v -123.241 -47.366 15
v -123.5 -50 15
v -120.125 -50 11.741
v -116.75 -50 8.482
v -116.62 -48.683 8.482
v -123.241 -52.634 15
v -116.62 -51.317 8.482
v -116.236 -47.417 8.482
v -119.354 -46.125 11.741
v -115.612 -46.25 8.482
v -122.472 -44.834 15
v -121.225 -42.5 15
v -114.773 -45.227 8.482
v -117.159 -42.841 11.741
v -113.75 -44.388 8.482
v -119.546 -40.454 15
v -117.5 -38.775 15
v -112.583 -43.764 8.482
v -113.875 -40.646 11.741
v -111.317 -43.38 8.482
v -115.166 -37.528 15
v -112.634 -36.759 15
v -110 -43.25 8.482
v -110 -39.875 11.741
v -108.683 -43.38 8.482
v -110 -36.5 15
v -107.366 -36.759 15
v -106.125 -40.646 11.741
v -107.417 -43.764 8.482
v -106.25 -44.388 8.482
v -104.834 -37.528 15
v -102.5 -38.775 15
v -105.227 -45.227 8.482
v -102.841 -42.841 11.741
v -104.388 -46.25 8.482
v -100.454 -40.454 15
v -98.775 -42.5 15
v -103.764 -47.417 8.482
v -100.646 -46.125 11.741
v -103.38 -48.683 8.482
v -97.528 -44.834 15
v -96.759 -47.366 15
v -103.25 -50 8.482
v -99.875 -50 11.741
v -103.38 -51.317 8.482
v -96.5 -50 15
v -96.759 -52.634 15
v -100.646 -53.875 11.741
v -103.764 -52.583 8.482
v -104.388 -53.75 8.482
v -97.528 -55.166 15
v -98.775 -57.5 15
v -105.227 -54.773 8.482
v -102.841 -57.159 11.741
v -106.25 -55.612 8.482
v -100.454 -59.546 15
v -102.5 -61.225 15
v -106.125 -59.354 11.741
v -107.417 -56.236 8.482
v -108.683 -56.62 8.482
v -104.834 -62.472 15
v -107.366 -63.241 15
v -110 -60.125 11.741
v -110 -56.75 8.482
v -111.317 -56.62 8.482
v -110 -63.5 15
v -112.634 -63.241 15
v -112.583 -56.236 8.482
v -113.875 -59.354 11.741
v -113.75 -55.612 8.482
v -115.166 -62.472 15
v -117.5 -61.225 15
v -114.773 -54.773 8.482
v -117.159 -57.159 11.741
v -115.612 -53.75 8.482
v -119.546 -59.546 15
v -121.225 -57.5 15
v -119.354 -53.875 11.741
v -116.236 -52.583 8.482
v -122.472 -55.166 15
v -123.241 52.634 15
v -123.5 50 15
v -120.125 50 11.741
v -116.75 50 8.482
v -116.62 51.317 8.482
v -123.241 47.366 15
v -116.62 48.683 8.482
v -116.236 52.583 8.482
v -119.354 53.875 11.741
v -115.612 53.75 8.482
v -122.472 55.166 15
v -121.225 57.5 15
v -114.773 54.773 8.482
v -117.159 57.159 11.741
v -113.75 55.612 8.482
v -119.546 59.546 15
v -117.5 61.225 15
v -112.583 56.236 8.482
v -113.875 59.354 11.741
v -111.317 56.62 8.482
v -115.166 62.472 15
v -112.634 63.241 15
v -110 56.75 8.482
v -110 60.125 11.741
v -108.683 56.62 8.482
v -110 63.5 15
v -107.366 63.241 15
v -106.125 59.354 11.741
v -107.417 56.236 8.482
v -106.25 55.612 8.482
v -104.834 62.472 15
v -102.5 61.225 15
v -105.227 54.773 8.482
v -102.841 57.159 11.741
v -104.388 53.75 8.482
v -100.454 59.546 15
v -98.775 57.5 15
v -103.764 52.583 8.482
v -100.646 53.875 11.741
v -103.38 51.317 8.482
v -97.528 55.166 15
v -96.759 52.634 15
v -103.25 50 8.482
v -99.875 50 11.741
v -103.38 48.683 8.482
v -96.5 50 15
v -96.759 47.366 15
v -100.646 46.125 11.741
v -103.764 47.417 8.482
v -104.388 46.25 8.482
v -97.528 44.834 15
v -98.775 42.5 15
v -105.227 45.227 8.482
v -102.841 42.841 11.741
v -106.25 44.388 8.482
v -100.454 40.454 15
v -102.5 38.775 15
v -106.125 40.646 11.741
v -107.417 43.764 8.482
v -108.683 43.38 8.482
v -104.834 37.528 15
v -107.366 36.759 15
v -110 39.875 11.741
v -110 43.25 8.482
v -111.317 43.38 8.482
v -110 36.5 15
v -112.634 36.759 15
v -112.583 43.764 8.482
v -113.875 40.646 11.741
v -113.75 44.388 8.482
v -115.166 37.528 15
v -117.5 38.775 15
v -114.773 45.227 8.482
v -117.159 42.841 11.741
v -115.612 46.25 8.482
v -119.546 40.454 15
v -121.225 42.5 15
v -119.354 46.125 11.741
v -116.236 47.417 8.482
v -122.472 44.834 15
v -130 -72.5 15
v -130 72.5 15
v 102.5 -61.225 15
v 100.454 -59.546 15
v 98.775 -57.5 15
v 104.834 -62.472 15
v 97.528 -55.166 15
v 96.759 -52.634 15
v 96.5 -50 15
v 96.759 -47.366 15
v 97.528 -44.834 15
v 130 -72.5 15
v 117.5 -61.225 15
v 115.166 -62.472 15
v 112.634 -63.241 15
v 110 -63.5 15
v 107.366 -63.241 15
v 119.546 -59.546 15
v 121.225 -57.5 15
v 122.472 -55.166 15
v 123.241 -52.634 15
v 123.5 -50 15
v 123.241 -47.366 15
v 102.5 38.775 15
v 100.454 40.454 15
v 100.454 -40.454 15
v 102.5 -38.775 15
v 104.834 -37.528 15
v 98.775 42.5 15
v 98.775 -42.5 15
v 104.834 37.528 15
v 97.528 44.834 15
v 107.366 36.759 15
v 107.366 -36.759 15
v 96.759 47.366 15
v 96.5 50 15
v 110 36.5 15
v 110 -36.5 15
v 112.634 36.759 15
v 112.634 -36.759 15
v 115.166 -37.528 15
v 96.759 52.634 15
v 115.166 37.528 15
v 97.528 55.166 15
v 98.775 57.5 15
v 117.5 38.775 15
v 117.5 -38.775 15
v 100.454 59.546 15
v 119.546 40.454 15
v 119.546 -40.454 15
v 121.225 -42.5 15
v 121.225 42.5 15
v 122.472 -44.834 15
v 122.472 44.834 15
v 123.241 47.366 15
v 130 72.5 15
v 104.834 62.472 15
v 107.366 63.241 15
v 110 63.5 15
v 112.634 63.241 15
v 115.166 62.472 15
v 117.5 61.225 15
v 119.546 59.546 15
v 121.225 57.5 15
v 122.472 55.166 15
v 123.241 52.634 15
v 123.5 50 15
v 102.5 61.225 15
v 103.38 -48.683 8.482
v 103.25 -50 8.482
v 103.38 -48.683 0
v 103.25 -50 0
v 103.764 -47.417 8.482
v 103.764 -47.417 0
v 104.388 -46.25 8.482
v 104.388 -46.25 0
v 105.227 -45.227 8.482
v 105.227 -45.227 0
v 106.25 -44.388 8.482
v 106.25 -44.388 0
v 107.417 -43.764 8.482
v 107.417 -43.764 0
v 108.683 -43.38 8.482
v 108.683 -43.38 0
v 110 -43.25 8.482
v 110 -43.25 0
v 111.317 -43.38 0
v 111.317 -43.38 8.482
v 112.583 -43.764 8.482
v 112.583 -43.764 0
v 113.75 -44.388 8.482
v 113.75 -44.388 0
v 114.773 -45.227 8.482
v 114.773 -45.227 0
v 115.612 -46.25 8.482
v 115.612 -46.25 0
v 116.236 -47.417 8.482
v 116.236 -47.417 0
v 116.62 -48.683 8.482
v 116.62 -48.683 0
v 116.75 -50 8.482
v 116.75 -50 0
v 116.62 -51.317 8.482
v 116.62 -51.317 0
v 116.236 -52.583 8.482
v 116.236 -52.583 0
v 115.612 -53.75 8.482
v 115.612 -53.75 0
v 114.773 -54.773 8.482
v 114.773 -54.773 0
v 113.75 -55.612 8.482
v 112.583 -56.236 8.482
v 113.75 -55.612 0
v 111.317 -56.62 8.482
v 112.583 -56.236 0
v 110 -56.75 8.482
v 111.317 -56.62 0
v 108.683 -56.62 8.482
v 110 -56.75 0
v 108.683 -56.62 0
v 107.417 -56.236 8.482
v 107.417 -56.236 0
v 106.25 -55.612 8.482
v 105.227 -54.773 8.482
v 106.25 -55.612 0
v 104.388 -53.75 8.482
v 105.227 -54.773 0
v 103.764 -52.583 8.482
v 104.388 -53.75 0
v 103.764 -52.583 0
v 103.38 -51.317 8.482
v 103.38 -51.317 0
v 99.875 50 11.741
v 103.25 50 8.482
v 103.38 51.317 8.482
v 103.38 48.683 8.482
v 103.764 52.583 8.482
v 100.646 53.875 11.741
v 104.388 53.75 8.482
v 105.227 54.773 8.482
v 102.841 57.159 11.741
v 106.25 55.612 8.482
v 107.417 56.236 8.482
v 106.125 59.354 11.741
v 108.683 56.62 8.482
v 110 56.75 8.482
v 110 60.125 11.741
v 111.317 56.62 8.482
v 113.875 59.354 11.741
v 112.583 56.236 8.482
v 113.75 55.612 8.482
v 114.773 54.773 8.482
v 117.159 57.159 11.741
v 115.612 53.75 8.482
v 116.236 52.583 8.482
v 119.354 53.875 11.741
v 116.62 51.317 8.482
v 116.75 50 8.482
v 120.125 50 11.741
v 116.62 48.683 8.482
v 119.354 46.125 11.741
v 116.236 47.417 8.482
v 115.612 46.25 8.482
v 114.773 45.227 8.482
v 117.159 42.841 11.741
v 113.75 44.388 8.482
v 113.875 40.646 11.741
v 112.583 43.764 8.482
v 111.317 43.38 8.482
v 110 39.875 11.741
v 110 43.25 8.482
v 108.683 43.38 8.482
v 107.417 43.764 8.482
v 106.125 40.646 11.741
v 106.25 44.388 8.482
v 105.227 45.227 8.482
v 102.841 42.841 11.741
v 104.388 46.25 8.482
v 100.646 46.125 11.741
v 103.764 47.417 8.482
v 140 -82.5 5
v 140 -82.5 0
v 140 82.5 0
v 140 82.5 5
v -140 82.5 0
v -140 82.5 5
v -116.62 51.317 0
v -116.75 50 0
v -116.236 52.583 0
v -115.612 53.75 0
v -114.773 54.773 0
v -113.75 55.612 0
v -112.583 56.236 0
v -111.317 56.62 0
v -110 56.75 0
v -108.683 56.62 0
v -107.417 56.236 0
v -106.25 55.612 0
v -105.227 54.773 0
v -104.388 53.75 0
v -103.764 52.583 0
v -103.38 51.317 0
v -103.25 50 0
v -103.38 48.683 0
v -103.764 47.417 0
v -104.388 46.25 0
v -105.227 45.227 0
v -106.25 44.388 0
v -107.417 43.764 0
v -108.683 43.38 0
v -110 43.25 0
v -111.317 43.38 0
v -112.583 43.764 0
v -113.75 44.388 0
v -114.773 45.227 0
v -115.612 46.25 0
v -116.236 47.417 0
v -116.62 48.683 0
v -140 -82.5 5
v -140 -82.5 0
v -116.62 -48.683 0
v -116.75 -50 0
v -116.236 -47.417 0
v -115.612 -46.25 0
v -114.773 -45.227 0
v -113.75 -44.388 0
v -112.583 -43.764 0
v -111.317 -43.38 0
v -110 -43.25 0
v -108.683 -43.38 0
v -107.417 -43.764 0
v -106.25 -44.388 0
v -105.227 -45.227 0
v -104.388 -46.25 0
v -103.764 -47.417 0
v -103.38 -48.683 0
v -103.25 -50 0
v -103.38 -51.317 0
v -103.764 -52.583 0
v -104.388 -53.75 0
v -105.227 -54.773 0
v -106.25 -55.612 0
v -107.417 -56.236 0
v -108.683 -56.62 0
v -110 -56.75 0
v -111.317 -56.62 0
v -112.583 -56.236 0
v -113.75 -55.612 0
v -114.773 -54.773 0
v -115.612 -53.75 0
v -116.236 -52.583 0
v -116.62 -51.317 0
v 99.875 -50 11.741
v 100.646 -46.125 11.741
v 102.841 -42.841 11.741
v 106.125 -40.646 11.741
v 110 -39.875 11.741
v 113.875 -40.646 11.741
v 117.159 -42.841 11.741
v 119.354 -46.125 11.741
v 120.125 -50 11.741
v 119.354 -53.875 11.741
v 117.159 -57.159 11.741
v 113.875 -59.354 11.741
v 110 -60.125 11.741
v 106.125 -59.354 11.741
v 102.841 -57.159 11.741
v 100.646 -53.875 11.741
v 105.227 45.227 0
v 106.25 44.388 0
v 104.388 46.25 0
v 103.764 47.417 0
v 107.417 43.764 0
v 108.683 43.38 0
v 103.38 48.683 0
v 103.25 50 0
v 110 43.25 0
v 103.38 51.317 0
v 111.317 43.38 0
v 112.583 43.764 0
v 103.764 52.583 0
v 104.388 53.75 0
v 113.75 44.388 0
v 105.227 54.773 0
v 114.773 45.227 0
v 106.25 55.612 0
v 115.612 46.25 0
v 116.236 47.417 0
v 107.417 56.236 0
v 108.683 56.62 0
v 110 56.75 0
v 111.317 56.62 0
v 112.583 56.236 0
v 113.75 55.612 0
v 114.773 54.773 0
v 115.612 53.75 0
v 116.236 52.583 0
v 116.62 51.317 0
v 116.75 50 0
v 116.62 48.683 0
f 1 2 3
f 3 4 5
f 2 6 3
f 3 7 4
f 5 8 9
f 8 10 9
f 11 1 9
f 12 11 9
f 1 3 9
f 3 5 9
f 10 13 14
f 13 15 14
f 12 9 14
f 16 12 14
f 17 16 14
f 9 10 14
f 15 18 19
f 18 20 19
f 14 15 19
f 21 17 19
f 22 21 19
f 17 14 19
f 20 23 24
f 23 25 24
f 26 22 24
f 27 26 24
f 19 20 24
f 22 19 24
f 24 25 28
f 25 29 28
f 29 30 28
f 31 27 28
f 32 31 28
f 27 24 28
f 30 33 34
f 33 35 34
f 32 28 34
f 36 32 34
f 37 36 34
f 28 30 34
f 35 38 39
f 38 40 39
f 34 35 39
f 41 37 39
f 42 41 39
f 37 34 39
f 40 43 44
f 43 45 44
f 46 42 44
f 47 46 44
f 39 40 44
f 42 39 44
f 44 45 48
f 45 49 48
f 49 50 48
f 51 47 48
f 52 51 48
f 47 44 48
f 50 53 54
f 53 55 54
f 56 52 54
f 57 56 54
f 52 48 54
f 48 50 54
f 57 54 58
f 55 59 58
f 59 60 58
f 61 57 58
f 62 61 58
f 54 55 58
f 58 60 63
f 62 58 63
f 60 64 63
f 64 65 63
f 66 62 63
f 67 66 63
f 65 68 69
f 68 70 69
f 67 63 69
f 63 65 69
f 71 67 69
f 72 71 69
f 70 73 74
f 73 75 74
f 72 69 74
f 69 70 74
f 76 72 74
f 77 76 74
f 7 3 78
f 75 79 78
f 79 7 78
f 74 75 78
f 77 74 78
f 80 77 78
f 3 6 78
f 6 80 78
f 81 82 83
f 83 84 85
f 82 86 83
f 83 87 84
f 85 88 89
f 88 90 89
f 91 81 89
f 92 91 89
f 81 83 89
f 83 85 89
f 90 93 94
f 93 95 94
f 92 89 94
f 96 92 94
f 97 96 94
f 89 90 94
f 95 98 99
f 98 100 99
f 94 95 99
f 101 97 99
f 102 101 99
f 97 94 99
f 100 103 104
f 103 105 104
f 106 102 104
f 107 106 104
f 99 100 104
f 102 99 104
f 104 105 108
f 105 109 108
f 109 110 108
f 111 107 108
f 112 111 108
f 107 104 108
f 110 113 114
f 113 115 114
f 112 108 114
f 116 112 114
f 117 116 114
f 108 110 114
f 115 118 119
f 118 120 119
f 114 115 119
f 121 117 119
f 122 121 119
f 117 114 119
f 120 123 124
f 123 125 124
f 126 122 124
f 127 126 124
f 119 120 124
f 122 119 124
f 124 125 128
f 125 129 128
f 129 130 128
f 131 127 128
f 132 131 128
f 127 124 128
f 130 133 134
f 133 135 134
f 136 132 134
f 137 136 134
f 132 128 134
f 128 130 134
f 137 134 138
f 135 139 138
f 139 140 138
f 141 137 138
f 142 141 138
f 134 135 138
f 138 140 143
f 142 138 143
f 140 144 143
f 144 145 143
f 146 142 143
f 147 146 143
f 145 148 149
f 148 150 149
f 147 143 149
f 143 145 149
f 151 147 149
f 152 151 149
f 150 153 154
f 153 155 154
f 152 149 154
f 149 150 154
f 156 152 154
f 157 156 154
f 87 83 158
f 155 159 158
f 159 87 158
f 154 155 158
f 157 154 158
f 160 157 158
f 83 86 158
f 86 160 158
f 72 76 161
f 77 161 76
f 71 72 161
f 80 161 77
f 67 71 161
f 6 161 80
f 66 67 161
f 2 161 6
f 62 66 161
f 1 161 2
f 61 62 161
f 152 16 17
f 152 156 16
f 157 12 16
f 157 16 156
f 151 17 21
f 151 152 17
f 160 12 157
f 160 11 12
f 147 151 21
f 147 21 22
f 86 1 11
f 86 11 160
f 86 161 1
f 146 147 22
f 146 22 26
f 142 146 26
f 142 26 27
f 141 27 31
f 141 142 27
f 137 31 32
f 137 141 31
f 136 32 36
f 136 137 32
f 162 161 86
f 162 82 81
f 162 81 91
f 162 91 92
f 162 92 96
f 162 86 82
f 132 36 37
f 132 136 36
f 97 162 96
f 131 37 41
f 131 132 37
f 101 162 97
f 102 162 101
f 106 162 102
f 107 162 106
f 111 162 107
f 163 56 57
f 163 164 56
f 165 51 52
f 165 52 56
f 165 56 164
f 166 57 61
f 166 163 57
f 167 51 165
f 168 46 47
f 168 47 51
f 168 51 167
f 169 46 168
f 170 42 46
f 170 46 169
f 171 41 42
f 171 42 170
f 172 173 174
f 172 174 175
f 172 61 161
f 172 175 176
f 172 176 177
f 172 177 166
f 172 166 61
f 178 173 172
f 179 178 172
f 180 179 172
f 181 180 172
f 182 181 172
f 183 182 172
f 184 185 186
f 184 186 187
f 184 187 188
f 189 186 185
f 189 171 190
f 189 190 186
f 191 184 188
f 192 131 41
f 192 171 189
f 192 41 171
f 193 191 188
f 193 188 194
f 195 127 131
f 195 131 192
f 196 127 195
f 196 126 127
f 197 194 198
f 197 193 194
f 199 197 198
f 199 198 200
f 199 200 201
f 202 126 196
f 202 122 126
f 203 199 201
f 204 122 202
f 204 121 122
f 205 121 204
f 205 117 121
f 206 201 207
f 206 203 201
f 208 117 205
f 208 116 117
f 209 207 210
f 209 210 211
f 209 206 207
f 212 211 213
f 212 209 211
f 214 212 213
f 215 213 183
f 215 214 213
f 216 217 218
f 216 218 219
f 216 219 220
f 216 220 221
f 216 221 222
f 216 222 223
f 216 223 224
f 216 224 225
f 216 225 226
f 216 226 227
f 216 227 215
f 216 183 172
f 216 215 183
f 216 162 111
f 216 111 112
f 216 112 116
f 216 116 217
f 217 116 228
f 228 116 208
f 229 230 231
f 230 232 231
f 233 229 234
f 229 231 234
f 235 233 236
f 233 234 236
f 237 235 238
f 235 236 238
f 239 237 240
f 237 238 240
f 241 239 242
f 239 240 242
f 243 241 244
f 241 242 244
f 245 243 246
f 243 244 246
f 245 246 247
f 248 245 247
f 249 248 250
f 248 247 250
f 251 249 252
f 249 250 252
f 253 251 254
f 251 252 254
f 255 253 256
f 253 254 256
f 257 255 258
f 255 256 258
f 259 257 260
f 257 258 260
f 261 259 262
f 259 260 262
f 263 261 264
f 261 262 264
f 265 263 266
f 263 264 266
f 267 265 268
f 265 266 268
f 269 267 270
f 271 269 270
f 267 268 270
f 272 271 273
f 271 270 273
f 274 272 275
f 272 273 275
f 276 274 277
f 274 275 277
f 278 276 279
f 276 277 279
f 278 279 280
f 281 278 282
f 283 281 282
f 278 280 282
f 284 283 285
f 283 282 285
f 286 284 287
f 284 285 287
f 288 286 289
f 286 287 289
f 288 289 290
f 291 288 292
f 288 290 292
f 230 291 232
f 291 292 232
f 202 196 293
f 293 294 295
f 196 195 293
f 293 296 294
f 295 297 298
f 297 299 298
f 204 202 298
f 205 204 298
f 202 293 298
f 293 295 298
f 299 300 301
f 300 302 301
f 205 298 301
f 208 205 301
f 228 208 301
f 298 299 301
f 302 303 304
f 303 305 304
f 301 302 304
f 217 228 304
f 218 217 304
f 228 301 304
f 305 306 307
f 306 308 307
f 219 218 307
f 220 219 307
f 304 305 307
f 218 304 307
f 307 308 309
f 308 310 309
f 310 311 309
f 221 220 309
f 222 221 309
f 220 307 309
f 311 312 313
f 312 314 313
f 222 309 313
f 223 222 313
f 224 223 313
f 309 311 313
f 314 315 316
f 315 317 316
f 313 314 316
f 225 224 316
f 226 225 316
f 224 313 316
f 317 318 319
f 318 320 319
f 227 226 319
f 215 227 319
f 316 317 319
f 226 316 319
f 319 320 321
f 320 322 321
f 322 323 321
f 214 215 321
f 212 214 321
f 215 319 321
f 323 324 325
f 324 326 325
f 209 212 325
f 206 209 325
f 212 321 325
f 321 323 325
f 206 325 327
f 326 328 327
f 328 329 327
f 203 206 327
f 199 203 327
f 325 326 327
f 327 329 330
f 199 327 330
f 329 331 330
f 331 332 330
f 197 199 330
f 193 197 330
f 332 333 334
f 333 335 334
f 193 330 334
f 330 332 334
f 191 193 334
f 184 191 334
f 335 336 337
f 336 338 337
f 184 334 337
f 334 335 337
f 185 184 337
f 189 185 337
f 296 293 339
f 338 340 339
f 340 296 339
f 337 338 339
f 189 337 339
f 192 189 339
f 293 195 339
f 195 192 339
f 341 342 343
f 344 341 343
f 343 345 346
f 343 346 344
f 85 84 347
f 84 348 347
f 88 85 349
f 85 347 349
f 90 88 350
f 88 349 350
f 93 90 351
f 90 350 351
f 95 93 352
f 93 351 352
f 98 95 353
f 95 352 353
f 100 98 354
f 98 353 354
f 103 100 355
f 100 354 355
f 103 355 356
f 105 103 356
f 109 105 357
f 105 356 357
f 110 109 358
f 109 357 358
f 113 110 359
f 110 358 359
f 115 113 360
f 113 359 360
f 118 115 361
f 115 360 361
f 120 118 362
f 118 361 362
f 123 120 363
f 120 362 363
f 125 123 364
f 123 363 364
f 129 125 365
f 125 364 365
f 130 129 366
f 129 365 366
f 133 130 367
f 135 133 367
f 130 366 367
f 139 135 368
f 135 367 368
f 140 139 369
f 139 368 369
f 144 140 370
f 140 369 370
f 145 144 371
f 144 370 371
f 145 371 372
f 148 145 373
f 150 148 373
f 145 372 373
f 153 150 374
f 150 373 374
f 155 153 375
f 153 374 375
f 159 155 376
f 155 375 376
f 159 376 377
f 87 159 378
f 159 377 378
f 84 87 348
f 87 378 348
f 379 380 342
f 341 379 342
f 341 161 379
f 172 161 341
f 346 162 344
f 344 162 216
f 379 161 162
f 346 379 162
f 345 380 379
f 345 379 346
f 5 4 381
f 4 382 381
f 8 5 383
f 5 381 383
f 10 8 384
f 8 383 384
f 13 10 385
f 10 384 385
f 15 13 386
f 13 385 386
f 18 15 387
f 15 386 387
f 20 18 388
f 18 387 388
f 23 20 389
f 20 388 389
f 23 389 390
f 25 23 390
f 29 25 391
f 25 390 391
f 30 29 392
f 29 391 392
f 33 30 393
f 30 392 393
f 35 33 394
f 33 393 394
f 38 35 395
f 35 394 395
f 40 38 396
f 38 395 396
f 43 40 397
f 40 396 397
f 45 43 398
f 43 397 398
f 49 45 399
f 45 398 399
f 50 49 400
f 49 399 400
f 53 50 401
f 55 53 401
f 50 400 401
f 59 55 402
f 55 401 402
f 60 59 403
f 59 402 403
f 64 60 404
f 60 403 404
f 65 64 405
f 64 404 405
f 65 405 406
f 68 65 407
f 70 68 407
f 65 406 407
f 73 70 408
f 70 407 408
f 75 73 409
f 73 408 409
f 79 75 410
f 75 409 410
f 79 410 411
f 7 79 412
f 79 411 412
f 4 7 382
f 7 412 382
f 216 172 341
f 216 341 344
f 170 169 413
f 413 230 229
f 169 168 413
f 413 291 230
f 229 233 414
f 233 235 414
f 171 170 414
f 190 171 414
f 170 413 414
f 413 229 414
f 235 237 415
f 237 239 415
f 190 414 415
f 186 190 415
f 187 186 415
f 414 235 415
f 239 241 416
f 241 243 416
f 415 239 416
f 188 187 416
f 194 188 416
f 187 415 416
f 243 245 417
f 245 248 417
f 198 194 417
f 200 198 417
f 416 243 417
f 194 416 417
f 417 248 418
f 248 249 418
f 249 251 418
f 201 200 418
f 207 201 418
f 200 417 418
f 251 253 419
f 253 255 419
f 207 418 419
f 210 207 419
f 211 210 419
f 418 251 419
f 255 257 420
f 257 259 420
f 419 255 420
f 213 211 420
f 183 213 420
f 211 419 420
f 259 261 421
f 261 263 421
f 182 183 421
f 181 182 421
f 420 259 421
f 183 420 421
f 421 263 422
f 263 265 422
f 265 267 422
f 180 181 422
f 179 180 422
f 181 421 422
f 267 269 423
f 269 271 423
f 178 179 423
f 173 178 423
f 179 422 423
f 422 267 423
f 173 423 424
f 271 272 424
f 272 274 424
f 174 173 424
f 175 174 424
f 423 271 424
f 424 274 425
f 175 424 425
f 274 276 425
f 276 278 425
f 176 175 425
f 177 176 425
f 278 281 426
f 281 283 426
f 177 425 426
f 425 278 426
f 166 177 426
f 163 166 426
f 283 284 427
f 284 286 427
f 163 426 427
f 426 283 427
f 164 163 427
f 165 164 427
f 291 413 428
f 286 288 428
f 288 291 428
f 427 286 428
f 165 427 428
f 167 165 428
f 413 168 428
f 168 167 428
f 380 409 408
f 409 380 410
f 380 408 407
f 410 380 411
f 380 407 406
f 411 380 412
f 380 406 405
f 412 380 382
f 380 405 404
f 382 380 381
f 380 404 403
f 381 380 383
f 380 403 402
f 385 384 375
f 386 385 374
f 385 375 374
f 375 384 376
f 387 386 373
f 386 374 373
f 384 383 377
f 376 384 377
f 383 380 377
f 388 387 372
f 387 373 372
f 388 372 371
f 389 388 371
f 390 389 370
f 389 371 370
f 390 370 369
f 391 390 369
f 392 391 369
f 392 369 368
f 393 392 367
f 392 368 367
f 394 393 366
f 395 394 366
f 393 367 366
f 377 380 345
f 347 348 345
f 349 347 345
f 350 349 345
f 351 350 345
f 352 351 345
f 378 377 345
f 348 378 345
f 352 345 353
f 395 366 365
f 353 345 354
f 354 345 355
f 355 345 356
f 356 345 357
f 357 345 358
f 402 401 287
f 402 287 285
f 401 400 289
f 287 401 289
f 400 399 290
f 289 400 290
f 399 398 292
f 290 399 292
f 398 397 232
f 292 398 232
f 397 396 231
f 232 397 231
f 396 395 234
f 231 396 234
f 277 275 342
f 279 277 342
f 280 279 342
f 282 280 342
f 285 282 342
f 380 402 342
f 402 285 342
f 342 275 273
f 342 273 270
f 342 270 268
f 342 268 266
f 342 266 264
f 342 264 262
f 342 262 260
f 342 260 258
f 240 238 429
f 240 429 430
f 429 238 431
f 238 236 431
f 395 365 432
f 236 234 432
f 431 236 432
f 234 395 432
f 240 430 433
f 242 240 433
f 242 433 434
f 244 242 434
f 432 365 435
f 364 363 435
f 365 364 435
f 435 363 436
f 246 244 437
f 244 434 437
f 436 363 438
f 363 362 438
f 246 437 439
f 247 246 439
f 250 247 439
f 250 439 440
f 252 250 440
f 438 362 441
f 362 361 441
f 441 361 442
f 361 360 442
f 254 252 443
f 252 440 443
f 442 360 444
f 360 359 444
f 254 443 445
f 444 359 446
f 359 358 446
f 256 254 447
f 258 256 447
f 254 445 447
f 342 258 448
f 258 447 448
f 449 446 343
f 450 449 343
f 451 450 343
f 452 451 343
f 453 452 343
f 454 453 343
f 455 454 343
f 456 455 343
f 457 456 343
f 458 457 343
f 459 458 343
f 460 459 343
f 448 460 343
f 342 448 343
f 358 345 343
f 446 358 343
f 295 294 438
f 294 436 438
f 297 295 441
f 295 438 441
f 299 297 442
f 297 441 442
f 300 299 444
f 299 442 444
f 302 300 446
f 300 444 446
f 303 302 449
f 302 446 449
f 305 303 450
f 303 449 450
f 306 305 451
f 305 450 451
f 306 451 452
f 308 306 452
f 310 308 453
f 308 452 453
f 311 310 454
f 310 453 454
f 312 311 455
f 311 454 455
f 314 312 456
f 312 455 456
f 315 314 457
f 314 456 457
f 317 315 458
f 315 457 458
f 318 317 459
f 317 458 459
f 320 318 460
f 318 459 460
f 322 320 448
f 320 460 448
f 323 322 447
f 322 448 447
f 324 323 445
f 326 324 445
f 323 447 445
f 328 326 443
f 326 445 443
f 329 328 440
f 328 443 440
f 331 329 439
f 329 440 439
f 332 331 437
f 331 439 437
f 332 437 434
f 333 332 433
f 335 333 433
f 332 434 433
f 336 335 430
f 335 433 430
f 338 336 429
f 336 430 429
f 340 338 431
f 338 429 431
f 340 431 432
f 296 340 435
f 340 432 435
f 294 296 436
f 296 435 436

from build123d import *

# Parameters (mm, degrees)
SKETCH_1_W                = 280
SKETCH_1_H                = 165
EXTRUDE_1_DEPTH           = 15
CHAMFER_1_SIZE            = 10
HOLE_WIZARD_1_D           = 13.5
HOLE_WIZARD_1_DEPTH       = 20
HOLE_WIZARD_1_CSINK_D     = 27
HOLE_WIZARD_1_CSINK_ANGLE = 92
HOLE_WIZARD_1_TIP         = 4.055809178


with BuildPart() as part:
    # 草图1 → 凸台-拉伸1 (new body)
    with BuildSketch(Plane.XY):
        Rectangle(SKETCH_1_W, SKETCH_1_H)
    extrude(amount=EXTRUDE_1_DEPTH)

    # 倒角1
    chamfer_1_edges = [part.edges().sort_by_distance(p)[0] for p in [
        (-140, 0, 15),
        (0, -82.5, 15),
        (140, 0, 15),
        (0, 82.5, 15),
    ]]
    chamfer(chamfer_1_edges, length=CHAMFER_1_SIZE)

    # 打孔尺寸(%根据)内六角花形沉头螺钉的类型1
    with Locations(Plane.XY.offset(15)):
        with Locations((-110, 50), (110, 50), (110, -50), (-110, -50)):
            CounterSinkHole(HOLE_WIZARD_1_D / 2, HOLE_WIZARD_1_CSINK_D / 2, depth=HOLE_WIZARD_1_DEPTH, counter_sink_angle=HOLE_WIZARD_1_CSINK_ANGLE)
            with Locations((0, 0, -(HOLE_WIZARD_1_DEPTH + HOLE_WIZARD_1_TIP / 2))):  # 118° drill point
                Cone(0, HOLE_WIZARD_1_D / 2, HOLE_WIZARD_1_TIP, mode=Mode.SUBTRACT)


solid = part.part
